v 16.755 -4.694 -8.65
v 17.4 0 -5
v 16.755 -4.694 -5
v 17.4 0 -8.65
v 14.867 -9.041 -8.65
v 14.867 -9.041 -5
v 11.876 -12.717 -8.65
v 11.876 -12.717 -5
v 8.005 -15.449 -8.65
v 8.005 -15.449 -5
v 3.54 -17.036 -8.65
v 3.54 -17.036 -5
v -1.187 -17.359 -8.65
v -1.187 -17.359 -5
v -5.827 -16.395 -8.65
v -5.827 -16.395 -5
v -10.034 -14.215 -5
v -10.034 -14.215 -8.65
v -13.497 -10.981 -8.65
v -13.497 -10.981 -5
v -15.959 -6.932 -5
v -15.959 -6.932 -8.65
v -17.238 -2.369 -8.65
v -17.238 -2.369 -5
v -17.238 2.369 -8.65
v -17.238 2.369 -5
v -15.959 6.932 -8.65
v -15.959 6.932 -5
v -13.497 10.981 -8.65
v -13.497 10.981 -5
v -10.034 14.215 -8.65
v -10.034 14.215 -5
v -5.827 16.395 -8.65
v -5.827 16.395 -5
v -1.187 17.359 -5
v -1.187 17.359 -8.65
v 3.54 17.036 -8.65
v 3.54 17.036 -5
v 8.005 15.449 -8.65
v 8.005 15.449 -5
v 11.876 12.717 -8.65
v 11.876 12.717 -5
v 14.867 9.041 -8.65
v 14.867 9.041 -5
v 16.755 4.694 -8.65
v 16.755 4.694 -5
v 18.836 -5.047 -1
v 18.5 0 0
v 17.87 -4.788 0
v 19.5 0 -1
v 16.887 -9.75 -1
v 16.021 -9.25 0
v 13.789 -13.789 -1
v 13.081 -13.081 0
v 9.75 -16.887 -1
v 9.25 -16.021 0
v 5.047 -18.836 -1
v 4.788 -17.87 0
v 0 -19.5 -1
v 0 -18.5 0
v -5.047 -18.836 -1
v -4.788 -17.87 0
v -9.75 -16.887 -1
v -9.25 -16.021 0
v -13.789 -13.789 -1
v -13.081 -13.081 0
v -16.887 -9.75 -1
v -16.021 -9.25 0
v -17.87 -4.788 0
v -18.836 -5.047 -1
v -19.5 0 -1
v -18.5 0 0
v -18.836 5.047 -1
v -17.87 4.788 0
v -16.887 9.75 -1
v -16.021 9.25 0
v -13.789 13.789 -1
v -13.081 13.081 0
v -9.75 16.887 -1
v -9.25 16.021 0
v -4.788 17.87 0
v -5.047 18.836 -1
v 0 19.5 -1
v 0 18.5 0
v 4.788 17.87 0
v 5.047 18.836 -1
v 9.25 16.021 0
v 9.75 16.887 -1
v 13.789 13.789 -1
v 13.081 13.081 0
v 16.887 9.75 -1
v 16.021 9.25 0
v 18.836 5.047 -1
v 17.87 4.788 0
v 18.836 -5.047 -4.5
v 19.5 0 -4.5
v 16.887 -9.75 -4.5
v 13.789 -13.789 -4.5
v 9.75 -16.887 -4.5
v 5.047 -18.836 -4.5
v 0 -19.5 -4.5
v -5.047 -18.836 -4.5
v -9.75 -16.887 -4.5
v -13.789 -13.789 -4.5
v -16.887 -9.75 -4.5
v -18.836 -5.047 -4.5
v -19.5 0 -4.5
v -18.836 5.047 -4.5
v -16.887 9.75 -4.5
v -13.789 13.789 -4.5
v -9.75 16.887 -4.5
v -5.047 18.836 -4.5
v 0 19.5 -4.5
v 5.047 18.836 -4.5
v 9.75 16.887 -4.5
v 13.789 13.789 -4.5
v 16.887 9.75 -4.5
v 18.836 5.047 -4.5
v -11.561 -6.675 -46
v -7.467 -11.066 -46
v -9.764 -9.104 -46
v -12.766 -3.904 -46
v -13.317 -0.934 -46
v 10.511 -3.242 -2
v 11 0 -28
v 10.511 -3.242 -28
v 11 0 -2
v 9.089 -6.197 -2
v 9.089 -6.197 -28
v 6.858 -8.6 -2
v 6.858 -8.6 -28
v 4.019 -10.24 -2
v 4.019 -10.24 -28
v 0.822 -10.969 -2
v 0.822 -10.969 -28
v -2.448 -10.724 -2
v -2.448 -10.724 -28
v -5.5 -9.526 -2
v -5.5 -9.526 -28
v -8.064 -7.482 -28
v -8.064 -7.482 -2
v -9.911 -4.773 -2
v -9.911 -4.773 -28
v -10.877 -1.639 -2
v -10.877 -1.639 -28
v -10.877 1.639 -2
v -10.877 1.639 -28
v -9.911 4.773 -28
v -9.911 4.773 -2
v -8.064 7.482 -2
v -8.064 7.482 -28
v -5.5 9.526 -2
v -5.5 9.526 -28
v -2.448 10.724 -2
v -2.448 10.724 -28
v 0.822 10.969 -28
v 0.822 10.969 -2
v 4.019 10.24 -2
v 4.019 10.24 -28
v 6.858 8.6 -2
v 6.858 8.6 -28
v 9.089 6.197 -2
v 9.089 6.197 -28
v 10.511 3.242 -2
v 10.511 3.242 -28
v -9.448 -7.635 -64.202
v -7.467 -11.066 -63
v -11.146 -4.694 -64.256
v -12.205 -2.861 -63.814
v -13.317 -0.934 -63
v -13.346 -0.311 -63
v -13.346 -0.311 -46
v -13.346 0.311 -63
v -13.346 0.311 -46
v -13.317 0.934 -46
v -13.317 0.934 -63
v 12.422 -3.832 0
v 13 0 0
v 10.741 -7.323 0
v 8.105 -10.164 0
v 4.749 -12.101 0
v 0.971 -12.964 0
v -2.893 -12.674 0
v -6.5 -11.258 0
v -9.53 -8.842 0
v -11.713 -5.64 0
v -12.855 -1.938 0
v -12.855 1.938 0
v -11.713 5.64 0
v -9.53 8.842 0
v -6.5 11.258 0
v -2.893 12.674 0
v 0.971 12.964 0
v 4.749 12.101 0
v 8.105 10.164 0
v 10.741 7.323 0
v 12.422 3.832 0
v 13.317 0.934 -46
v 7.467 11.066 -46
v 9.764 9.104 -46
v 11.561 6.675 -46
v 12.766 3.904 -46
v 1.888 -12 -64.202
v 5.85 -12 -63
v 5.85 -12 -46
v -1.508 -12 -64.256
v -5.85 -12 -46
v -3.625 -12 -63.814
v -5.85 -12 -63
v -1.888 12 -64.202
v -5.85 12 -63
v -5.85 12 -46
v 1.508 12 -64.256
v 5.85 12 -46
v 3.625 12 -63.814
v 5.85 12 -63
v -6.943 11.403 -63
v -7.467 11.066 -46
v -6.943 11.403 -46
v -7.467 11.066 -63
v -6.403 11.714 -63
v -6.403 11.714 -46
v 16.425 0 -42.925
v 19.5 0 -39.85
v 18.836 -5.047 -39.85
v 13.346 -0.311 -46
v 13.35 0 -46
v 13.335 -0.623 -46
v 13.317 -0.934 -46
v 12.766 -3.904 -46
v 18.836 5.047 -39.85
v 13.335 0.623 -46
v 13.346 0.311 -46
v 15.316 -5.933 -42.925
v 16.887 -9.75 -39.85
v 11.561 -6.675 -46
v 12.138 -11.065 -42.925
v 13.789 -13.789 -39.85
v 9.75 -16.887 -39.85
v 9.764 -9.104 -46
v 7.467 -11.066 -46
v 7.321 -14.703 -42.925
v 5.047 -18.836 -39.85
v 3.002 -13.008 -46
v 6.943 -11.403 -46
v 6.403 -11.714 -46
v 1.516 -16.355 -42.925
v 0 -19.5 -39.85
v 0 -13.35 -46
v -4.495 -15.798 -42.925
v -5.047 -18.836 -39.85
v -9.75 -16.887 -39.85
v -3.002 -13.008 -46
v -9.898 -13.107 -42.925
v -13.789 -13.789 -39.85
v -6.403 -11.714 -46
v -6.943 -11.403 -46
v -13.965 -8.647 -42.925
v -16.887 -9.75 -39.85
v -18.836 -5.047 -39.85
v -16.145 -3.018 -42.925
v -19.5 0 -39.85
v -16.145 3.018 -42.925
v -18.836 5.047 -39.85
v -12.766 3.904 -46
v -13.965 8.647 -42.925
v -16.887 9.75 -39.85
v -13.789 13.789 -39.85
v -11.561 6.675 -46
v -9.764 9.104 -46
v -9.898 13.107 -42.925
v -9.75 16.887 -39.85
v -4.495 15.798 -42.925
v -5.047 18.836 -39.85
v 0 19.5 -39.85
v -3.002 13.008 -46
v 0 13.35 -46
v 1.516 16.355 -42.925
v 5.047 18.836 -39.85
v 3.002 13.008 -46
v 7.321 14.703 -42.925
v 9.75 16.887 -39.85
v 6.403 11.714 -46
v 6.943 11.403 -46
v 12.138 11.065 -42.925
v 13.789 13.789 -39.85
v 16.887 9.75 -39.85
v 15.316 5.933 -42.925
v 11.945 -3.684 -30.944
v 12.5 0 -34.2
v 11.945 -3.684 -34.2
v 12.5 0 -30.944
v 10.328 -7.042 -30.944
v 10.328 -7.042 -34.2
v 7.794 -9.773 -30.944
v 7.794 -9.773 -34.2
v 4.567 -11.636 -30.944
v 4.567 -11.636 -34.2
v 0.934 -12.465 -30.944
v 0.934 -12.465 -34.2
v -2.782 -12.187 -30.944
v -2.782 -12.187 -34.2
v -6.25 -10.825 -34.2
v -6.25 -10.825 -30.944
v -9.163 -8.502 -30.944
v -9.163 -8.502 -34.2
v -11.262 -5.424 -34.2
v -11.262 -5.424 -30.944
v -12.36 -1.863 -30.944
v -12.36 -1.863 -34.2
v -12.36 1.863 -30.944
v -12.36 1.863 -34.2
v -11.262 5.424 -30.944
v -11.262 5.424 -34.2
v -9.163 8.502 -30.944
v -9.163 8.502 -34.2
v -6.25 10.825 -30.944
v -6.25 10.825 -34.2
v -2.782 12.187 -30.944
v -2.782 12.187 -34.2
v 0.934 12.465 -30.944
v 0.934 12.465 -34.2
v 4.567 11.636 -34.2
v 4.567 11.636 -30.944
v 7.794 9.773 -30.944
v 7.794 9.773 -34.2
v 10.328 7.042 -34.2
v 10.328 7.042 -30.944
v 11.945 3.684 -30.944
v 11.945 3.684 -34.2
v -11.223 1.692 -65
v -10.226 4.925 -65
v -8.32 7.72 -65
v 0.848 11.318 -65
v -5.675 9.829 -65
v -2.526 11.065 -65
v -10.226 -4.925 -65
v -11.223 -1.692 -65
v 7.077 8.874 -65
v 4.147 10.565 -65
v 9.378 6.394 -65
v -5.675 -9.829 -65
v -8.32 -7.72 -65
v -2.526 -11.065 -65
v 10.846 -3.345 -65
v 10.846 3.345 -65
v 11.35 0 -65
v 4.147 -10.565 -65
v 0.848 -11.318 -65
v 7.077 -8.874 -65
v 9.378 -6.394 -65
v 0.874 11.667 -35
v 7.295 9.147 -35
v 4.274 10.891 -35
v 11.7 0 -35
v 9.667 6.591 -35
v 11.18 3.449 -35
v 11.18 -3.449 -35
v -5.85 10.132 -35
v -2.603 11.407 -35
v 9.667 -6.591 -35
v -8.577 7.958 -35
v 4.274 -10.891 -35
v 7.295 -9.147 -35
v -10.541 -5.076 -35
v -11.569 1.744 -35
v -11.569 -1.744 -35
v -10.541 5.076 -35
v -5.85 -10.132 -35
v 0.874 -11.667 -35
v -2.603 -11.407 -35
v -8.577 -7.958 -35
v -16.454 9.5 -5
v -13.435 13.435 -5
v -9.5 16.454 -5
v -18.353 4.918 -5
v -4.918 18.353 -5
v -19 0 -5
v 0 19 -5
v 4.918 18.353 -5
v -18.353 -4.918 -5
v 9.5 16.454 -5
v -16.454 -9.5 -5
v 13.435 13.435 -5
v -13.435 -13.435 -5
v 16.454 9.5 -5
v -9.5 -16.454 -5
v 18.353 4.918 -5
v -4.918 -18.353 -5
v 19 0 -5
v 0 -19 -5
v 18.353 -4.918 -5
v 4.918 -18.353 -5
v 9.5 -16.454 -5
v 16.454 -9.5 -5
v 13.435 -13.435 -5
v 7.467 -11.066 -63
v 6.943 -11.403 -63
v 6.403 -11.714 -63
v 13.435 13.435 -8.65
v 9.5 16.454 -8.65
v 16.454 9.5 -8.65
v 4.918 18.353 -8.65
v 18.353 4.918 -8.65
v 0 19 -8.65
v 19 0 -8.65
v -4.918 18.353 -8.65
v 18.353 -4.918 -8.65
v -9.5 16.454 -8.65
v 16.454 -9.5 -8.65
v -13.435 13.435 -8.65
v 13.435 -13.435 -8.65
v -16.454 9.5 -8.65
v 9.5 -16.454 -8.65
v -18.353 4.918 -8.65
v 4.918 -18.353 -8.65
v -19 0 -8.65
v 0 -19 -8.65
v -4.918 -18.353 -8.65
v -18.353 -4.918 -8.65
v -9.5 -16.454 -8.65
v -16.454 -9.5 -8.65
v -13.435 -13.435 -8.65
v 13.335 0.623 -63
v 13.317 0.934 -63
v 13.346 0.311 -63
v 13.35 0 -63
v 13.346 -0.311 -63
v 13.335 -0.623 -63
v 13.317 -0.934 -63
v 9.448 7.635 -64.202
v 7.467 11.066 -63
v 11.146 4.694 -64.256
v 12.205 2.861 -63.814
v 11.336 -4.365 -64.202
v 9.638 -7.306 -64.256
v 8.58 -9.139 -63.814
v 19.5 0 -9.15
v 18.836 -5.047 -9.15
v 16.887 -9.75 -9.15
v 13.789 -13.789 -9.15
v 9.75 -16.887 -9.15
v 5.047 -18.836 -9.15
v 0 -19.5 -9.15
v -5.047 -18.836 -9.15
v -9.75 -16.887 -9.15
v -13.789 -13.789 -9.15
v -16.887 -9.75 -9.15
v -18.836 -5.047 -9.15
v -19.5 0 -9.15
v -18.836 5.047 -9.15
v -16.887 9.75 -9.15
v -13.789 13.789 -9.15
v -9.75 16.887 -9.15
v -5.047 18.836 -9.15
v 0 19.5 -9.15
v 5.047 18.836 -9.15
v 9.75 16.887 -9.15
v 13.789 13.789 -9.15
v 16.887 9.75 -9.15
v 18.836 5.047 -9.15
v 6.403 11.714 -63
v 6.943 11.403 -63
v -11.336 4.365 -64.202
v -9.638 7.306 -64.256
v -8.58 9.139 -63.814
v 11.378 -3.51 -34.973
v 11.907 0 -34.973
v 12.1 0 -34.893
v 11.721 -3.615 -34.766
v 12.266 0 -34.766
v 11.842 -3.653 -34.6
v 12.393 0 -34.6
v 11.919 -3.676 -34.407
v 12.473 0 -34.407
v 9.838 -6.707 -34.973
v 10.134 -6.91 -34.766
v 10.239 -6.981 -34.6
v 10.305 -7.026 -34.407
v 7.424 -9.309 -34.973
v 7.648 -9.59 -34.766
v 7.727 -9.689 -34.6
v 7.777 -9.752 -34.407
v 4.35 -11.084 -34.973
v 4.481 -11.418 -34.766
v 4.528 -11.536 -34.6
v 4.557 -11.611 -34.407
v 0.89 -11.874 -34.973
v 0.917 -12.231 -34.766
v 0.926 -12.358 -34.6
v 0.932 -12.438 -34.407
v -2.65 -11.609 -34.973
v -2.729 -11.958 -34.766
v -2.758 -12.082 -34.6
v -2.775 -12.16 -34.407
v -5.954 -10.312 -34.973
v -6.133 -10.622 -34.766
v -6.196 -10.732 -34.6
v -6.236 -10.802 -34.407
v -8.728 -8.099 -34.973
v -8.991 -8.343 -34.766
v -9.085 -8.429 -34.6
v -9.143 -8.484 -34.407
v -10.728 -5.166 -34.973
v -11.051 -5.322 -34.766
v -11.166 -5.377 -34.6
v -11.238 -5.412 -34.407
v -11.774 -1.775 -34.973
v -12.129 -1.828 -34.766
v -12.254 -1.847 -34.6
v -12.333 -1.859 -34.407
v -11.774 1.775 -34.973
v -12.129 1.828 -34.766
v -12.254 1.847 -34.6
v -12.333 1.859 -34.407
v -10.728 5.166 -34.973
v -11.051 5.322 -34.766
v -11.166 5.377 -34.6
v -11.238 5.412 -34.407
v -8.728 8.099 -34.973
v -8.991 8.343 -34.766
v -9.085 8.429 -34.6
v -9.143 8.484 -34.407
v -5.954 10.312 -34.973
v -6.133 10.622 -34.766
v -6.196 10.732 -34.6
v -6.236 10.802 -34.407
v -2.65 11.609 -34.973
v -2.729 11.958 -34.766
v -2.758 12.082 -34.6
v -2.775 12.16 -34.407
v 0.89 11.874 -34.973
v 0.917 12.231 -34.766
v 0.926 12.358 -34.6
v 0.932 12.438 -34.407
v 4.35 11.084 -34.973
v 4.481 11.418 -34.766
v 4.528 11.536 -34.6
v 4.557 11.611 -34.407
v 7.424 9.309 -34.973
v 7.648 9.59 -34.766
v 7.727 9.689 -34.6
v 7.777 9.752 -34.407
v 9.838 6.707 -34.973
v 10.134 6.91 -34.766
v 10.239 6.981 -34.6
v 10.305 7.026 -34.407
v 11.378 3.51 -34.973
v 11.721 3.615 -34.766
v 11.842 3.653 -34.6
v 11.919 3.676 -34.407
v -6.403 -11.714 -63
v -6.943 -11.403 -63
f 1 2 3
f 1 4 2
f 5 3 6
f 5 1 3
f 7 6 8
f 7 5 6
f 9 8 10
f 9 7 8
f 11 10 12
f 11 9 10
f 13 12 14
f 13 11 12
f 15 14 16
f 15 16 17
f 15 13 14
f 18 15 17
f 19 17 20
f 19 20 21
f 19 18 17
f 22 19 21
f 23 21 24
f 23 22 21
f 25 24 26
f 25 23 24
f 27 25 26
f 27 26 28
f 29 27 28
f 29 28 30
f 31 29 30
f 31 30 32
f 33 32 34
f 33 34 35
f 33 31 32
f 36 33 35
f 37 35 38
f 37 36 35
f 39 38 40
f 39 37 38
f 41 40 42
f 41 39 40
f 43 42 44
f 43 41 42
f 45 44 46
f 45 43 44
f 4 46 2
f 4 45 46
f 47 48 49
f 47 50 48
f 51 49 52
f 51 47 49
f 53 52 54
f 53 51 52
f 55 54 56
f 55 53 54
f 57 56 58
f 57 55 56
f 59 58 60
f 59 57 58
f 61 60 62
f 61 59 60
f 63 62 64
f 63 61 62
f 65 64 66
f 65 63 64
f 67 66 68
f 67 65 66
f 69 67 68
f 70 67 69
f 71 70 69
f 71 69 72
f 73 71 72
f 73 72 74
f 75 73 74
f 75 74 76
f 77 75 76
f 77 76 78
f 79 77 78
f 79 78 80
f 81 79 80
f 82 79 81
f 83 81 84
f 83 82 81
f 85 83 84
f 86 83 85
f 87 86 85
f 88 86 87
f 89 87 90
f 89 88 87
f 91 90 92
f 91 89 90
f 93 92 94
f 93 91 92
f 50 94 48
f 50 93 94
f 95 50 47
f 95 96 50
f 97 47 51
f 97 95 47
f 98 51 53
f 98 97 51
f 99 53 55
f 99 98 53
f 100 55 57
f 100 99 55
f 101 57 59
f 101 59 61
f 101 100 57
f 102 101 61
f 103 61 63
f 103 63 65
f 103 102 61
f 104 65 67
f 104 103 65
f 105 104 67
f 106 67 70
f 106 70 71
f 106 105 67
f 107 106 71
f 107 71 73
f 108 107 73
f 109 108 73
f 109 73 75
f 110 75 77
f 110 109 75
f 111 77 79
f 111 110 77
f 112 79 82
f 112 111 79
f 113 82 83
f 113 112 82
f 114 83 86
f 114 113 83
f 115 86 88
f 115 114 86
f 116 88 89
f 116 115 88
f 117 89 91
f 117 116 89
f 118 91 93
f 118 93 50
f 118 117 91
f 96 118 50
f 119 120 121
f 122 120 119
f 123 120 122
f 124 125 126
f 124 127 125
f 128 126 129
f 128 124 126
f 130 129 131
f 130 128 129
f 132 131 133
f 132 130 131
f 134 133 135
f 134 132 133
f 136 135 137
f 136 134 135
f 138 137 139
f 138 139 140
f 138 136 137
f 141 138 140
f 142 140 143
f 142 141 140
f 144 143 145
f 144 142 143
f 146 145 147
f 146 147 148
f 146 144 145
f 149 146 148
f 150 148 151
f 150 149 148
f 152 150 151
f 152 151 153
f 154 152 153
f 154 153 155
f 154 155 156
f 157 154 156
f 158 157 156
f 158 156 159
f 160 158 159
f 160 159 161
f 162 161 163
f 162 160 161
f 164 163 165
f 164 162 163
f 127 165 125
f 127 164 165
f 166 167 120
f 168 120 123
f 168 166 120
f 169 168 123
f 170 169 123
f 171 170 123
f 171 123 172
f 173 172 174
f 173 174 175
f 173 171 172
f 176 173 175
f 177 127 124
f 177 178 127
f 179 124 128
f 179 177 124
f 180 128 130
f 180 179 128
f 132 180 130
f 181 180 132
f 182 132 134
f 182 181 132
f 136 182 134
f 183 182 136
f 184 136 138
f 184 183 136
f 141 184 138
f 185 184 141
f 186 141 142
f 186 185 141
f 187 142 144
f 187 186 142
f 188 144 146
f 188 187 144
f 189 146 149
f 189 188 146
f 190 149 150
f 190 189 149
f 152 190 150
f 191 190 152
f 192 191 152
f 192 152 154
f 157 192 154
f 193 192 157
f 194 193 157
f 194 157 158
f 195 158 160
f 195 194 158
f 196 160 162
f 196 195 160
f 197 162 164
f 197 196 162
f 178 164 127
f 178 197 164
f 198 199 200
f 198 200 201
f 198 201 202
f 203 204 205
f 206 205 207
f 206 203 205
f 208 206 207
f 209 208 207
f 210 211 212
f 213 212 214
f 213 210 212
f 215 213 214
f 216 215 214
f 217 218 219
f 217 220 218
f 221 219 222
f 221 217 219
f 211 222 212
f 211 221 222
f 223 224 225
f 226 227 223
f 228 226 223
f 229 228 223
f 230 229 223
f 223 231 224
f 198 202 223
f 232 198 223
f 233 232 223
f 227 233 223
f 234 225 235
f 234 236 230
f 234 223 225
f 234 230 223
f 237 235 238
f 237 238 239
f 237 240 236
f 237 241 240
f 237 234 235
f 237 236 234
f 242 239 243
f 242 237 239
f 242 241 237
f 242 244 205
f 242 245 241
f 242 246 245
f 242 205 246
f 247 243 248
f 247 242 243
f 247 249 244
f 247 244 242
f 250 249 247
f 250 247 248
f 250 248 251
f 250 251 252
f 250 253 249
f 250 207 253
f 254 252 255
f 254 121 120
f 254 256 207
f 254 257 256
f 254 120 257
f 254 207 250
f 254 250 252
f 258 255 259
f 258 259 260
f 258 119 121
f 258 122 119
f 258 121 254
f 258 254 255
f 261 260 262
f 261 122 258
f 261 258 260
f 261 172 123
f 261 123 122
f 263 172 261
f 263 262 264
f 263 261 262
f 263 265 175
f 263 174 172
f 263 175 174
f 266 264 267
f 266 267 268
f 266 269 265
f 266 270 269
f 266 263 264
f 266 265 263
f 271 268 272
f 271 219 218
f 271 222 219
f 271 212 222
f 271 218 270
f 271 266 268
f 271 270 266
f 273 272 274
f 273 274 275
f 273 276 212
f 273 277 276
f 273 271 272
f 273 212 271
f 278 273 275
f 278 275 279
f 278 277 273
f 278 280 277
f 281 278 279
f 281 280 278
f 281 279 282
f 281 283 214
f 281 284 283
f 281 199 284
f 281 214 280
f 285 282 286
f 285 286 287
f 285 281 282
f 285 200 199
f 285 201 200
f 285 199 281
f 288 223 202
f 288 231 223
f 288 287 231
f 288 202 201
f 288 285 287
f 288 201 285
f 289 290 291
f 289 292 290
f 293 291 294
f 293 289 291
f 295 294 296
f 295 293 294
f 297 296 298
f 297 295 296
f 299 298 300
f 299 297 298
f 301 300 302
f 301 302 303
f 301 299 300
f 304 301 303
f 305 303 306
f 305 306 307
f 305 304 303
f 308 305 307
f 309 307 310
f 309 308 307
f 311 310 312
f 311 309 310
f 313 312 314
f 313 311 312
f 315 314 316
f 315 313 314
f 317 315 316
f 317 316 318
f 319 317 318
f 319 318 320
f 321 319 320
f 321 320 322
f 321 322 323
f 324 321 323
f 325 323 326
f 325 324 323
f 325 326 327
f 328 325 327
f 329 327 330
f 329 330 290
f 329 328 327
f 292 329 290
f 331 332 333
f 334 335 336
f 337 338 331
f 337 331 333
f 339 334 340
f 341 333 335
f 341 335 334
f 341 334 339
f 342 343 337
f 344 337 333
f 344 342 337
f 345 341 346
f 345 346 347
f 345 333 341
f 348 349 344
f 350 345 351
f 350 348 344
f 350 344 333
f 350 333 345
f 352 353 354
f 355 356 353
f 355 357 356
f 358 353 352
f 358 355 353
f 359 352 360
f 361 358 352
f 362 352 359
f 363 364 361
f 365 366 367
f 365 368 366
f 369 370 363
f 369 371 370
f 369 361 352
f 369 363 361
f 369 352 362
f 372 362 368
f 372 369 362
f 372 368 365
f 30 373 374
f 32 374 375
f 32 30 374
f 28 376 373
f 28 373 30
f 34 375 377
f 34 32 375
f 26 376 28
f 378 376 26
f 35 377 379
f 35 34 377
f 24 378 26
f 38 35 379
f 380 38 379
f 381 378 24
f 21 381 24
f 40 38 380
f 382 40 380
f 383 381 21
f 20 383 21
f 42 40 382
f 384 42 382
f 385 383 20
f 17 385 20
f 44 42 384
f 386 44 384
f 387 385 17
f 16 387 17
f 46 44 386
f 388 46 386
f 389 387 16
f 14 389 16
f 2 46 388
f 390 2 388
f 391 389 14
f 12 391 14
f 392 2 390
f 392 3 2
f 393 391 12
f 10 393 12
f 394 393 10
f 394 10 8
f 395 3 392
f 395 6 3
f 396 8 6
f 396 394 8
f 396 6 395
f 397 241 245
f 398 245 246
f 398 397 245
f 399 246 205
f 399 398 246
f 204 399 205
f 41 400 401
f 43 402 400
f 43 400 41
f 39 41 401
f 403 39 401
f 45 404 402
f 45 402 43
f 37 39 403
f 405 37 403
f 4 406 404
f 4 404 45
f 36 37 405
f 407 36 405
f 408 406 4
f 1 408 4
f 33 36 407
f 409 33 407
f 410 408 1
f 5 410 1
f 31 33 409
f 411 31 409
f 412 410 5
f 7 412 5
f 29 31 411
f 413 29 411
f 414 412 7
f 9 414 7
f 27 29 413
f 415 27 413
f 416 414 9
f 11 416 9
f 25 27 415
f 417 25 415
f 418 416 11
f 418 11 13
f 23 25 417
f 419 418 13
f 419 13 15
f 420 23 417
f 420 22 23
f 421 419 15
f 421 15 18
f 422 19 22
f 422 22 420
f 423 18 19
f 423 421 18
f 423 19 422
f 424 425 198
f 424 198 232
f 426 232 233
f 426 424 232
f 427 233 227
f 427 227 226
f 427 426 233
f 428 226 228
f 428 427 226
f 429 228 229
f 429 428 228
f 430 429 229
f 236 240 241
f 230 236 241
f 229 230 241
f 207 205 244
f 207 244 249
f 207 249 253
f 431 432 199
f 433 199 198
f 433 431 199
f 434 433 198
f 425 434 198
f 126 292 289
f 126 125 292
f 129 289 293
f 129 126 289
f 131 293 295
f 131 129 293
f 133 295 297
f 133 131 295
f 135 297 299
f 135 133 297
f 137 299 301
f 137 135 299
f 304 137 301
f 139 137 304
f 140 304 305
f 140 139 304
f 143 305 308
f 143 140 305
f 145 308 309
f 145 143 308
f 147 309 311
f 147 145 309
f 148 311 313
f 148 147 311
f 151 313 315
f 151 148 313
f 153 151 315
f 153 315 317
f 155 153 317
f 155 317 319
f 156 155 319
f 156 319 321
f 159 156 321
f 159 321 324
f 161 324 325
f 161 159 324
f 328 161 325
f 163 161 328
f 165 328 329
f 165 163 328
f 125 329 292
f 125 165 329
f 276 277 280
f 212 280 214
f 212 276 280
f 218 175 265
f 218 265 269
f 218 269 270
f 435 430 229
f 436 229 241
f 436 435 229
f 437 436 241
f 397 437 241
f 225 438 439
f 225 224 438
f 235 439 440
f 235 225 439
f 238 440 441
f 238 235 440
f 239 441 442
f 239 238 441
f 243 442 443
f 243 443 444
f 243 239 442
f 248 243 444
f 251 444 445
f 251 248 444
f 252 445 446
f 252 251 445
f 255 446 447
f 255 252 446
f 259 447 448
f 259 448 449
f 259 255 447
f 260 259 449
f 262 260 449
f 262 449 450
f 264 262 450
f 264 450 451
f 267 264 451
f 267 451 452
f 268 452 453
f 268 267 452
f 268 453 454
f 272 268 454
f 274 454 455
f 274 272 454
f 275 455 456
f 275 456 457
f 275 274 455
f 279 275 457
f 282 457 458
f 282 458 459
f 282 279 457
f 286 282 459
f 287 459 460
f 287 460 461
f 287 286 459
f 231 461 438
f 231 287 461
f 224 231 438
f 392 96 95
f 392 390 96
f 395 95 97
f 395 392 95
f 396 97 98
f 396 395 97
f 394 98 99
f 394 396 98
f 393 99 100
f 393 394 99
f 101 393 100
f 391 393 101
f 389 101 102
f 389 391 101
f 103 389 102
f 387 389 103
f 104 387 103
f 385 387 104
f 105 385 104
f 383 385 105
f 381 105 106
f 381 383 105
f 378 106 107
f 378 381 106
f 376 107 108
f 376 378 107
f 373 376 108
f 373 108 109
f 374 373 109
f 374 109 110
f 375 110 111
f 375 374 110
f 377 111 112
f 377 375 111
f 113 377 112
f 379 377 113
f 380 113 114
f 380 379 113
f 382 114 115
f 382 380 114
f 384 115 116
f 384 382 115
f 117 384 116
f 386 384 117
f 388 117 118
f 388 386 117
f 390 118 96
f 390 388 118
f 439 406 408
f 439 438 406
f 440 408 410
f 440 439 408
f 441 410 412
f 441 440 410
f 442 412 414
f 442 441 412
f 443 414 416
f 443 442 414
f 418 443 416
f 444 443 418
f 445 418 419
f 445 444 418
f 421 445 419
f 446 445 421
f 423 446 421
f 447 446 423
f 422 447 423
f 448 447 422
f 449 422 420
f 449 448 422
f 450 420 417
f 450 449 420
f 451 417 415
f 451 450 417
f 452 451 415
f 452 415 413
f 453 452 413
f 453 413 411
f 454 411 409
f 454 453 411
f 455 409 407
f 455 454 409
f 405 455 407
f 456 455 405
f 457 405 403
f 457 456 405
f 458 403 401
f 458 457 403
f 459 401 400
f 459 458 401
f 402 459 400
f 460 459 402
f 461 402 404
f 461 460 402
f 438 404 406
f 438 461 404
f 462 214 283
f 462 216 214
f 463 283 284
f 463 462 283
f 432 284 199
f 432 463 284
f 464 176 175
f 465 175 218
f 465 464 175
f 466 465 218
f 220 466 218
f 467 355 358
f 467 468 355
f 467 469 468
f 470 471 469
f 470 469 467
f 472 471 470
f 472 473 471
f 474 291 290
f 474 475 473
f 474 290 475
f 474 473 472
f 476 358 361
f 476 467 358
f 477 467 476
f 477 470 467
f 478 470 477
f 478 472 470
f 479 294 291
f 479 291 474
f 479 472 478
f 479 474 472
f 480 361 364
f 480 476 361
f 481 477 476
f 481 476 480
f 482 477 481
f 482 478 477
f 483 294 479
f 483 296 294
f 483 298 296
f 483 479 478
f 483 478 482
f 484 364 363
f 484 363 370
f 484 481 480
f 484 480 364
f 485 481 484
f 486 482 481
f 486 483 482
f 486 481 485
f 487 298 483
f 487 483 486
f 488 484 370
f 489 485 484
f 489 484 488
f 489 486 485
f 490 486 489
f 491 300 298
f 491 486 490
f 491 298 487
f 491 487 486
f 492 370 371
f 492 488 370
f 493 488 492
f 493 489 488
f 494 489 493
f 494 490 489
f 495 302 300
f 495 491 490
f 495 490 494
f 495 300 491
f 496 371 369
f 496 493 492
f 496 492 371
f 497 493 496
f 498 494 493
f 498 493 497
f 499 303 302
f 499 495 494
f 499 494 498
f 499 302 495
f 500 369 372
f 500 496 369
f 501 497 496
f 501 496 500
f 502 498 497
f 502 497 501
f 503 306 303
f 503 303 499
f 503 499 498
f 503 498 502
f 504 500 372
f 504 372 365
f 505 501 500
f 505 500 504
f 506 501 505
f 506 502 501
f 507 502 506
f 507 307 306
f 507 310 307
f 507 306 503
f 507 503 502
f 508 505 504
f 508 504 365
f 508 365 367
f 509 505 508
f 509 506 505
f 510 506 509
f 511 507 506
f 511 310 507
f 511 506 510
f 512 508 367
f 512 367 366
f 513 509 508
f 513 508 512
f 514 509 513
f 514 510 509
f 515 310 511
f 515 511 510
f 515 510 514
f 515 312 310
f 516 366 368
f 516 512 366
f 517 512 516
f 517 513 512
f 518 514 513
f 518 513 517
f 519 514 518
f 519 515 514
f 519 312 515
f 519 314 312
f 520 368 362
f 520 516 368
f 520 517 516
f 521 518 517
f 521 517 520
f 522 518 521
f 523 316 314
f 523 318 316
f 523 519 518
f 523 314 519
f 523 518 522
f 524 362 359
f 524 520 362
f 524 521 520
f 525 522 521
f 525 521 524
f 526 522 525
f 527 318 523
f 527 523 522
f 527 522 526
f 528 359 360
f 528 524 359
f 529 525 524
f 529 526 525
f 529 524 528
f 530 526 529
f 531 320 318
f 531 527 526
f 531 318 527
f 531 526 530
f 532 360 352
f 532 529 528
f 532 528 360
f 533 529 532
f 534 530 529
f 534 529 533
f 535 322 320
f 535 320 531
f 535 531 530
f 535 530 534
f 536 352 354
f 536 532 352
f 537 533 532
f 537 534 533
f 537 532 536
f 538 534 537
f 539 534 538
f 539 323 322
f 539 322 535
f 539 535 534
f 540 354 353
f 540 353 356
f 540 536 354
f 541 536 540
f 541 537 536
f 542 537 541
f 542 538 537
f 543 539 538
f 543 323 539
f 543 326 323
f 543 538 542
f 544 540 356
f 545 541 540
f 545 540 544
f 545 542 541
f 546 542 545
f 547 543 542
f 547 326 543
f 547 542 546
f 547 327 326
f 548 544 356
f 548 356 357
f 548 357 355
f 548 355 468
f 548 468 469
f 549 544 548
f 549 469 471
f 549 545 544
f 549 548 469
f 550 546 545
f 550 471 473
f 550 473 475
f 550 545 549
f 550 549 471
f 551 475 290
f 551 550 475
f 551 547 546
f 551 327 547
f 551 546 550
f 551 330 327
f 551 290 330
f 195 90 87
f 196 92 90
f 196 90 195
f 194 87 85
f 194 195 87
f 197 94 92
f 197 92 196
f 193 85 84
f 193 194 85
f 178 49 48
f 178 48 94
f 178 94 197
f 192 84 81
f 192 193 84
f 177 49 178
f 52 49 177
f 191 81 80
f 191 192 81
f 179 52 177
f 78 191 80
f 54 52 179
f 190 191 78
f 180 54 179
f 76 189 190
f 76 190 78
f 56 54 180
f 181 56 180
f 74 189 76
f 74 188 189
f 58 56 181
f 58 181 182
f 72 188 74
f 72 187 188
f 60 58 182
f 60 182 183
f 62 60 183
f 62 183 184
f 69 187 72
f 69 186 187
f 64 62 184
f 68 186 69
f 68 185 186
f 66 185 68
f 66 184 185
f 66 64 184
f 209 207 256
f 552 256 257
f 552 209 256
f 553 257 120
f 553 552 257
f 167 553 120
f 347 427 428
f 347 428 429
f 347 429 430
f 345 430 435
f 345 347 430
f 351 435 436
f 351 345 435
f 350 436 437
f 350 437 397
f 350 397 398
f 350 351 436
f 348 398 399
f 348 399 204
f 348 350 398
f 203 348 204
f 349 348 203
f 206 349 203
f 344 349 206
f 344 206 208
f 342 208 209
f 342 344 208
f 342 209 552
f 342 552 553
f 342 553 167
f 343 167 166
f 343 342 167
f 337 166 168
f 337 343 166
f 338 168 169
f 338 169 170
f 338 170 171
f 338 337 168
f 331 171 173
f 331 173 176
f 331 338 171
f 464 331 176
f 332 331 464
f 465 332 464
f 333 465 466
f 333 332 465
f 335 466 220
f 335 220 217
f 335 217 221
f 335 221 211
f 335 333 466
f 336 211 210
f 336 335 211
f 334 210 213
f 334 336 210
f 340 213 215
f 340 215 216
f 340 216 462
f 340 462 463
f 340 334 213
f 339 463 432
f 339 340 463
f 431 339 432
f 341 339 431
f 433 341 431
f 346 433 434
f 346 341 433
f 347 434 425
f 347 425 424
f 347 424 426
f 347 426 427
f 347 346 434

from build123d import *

# Parameters (mm, degrees)
SKETCH2_OUTSIDE_W  = 58.05
SKETCH2_OUTSIDE_H  = 58.05
CUT_EXTRUDE1_DEPTH = 19


with BuildPart() as part:
    # Sketch1 → Revolve1 (revolve)
    with BuildSketch(Plane(origin=(0, 0, 0), x_dir=(0, 0, -1), z_dir=(1, 0, 0)), mode=Mode.PRIVATE) as revolve1_sk:
        with BuildLine():
            Line((35, 0), (35, 11.7))
            ThreePointArc((35, 11.7), (34.765685425, 12.265685425), (34.2, 12.5))
            Line((34.2, 12.5), (30.943915758, 12.5))
            Line((30.943915758, 12.5), (28, 11))
            Line((28, 11), (2, 11))
            Line((2, 11), (0, 13))
            Line((0, 13), (0, 18.5))
            Line((0, 18.5), (1, 19.5))
            Line((1, 19.5), (4.5, 19.5))
            Line((4.5, 19.5), (5, 19))
            Line((5, 19), (5, 17.4))
            Line((5, 17.4), (8.65, 17.4))
            Line((8.65, 17.4), (8.65, 19))
            Line((8.65, 19), (9.15, 19.5))
            Line((9.15, 19.5), (39.85, 19.5))
            Line((39.85, 19.5), (46, 13.35))
            Line((46, 13.35), (63, 13.35))
            Line((63, 13.35), (65, 11.35))
            Line((65, 11.35), (65, 0))
            Line((65, 0), (35, 0))
        make_face()
    revolve(revolve1_sk.sketch.rotate(Axis((0, 0, 0), (0, 0, -1)), 90), axis=Axis((0, 0, 0), (0, 0, -1)))

    # Sketch2 outside → Cut-Extrude1 (cut)
    with BuildSketch(Plane(origin=(0, 0, -65), x_dir=(-1, 0, 0), z_dir=(0, 0, -1))):
        Rectangle(SKETCH2_OUTSIDE_W, SKETCH2_OUTSIDE_H)
        Polygon((-13.856406461, 0), (-6.92820323, -12), (6.92820323, -12), (13.856406461, 0), (6.92820323, 12), (-6.92820323, 12), align=None, mode=Mode.SUBTRACT)
    extrude(amount=-CUT_EXTRUDE1_DEPTH, mode=Mode.SUBTRACT)


solid = part.part
